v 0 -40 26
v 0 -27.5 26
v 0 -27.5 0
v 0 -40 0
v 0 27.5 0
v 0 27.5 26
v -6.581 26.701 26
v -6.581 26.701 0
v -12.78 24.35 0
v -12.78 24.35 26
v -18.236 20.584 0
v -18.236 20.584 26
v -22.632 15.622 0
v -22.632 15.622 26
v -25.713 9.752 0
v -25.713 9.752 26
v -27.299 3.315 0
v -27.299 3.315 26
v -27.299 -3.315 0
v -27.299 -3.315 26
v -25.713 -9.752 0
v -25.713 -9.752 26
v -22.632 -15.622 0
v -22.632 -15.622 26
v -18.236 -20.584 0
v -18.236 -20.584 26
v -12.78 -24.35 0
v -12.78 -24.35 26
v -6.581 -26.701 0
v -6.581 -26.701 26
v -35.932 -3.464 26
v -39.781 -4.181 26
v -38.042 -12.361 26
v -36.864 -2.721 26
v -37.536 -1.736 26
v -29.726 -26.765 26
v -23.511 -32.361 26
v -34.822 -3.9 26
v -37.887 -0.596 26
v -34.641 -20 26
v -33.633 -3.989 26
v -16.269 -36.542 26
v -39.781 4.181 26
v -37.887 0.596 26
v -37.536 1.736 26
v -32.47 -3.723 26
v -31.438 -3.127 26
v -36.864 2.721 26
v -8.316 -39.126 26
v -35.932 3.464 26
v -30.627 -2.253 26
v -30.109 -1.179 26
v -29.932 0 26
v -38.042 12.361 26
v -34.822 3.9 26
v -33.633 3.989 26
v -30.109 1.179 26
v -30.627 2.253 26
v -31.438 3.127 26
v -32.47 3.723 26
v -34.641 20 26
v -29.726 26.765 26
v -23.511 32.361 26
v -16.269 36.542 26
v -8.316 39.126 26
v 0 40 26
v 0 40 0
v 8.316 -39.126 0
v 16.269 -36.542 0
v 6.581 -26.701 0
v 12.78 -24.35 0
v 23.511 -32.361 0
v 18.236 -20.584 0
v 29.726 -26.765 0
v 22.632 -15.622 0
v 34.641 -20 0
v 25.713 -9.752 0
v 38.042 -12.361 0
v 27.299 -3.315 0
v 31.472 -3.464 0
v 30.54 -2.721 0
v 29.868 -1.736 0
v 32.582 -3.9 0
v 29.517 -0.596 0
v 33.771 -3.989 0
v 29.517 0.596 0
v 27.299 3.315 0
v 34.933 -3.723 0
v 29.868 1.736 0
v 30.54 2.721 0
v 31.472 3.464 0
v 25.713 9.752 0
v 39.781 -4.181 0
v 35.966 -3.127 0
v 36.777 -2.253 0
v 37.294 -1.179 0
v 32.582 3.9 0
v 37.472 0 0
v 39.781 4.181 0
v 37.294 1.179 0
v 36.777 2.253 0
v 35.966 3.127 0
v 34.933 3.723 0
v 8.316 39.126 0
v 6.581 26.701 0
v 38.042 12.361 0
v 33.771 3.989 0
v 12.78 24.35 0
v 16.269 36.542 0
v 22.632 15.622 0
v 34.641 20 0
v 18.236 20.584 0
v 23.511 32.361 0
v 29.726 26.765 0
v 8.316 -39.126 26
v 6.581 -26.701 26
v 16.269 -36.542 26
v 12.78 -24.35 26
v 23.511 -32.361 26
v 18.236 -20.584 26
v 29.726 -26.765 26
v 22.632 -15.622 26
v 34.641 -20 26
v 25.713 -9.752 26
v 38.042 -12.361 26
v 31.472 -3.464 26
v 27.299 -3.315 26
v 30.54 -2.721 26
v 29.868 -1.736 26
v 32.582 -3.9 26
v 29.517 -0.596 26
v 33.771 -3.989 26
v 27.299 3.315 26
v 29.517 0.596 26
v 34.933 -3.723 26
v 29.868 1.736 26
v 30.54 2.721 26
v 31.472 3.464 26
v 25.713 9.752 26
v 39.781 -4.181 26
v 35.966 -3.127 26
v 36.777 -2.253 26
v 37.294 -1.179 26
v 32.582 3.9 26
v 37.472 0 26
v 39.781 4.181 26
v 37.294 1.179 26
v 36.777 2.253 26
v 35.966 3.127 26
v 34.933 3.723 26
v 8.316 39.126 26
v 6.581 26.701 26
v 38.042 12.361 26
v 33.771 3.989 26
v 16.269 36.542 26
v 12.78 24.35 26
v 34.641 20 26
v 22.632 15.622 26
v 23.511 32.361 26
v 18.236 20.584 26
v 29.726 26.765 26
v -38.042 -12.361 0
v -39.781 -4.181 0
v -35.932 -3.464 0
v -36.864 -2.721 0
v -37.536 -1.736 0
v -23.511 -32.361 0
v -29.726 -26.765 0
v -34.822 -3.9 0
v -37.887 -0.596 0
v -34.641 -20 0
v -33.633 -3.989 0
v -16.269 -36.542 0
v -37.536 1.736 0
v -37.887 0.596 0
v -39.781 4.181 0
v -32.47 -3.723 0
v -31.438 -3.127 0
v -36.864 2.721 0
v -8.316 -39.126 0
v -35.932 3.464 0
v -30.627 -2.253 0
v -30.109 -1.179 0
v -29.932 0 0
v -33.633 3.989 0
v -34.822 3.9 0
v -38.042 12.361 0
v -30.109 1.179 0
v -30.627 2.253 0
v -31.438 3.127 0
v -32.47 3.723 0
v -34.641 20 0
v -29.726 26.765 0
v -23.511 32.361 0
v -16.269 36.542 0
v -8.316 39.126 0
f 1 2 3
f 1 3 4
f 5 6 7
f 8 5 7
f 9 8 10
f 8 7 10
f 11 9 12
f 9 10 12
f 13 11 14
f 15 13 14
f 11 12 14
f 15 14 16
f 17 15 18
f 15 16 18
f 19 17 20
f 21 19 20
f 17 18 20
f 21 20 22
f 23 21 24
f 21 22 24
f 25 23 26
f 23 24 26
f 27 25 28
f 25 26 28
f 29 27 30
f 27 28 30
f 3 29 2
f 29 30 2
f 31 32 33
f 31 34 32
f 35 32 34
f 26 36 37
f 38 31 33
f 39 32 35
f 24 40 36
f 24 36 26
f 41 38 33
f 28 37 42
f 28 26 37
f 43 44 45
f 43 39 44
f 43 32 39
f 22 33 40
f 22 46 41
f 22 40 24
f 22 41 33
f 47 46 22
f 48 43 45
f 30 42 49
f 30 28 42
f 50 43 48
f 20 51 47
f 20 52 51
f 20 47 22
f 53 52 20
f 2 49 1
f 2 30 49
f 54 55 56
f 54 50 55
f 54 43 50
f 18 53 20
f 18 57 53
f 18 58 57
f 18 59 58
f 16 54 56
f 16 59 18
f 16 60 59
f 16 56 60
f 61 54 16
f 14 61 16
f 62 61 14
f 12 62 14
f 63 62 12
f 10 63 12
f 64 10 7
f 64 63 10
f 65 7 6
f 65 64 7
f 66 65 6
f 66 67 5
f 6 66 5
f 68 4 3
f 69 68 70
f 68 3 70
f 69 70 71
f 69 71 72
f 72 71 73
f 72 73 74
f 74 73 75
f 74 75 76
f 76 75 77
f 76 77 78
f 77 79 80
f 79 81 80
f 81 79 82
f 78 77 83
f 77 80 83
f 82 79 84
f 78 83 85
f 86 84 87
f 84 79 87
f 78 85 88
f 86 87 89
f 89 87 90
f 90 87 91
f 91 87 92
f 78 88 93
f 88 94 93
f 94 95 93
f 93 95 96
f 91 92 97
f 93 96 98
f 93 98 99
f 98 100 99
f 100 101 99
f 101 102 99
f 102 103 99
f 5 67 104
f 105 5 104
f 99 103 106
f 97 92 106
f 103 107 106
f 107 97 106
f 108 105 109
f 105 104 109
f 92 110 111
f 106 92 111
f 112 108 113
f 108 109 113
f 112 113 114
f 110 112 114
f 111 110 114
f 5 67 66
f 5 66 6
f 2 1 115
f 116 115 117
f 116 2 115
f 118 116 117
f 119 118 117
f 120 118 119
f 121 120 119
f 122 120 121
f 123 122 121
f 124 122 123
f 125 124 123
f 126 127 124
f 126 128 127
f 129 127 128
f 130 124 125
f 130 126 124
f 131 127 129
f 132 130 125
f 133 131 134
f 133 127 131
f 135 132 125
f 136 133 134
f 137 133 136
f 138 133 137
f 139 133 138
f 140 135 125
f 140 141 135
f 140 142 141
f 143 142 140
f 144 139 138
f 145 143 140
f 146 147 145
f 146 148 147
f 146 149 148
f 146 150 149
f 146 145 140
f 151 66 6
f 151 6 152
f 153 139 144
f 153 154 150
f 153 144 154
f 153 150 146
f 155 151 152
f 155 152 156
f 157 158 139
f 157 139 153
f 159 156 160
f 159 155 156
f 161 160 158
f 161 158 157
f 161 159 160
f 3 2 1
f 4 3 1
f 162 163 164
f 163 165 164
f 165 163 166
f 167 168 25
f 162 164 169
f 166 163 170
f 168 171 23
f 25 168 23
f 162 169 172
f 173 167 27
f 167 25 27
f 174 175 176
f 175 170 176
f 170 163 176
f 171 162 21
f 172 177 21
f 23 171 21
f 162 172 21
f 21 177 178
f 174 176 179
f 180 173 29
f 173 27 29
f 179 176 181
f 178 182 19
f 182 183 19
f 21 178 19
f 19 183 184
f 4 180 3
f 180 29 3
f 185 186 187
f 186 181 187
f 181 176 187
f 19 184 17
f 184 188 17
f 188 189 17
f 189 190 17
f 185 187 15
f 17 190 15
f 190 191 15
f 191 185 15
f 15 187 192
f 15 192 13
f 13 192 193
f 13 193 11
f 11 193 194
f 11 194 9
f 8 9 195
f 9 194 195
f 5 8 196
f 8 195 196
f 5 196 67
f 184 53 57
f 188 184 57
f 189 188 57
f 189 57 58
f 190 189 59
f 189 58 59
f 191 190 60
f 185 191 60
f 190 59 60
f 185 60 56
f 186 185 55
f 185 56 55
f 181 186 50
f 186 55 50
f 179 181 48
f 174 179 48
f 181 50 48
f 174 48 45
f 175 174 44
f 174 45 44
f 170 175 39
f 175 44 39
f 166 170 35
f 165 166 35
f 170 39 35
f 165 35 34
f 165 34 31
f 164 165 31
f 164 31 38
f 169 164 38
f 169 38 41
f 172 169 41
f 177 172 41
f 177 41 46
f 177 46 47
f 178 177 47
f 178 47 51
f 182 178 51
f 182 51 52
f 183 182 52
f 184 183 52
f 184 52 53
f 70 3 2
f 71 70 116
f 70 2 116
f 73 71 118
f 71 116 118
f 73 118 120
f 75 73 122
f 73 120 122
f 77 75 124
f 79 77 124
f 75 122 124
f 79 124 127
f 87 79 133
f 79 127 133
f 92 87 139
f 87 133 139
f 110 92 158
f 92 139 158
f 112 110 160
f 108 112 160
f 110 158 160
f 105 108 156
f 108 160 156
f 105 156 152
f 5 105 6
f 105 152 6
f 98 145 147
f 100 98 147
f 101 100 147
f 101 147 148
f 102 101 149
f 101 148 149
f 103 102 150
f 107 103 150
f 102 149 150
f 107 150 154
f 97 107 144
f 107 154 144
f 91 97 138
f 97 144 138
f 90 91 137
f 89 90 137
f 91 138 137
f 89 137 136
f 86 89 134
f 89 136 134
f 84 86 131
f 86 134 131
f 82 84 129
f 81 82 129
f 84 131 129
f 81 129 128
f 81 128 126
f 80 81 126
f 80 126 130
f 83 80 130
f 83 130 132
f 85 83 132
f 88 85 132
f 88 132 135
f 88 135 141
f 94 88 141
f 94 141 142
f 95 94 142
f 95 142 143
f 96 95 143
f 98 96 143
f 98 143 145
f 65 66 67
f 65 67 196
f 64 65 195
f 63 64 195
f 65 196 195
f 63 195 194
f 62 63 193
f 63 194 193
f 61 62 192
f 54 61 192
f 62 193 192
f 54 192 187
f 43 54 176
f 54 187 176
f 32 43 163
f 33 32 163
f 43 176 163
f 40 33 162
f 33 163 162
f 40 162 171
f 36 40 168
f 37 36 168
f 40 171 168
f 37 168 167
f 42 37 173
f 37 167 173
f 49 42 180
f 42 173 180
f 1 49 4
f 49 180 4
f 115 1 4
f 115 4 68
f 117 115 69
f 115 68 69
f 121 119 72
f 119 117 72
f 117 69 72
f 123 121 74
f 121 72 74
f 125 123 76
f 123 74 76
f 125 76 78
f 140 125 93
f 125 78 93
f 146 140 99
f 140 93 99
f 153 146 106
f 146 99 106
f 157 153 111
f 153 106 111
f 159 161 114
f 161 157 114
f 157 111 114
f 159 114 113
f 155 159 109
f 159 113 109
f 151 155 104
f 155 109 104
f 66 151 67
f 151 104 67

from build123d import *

# Parameters (mm, degrees)
SKETCH1_R              = 40
BOSS_EXTRUDE1_DEPTH    = 26
SKETCH2_R              = 27.5
CUT_EXTRUDE1_DEPTH     = 63.257529665
SPLIT1_SURFACE_1_BACK  = 117.086
SPLIT1_SURFACE_1_DEPTH = 234.172
SPLIT1_SURFACE_2_BACK  = 117.086
SPLIT1_SURFACE_2_DEPTH = 234.172
SKETCH4_R              = 4
CUT_EXTRUDE3_DEPTH     = 63.257529665


with BuildPart() as part:
    # Sketch1 → Boss-Extrude1 (new body)
    with BuildSketch(Plane.XY):
        Circle(SKETCH1_R)
    extrude(amount=BOSS_EXTRUDE1_DEPTH)

    # Sketch2 → Cut-Extrude1 (cut, through all)
    with BuildSketch(Plane.XY.offset(26)):
        Circle(SKETCH2_R)
    extrude(amount=-CUT_EXTRUDE1_DEPTH, mode=Mode.SUBTRACT)


with BuildPart() as body_2:
    # Split1: the piece behind the surface
    add(part.part)
    # Split1 surface: a surface, the sketch's curves swept straight by 234.172 mm
    with BuildLine(Plane.XY.offset(-SPLIT1_SURFACE_1_BACK), mode=Mode.PRIVATE) as split1_surface_1_path:
        Line((0, 44.406753527), (0, -43.858522002))
    split1_surface_1 = Shell.extrude(split1_surface_1_path.wire(), (0 * SPLIT1_SURFACE_1_DEPTH, 0 * SPLIT1_SURFACE_1_DEPTH, 1 * SPLIT1_SURFACE_1_DEPTH))
    split(bisect_by=split1_surface_1, keep=Keep.BOTTOM)


with BuildPart() as part_1:
    add(part.part)

    # Split1: split by a surface, the side it looks to stays
    # Split1 surface: a surface, the sketch's curves swept straight by 234.172 mm
    with BuildLine(Plane.XY.offset(-SPLIT1_SURFACE_2_BACK), mode=Mode.PRIVATE) as split1_surface_2_path:
        Line((0, 44.406753527), (0, -43.858522002))
    split1_surface_2 = Shell.extrude(split1_surface_2_path.wire(), (0 * SPLIT1_SURFACE_2_DEPTH, 0 * SPLIT1_SURFACE_2_DEPTH, 1 * SPLIT1_SURFACE_2_DEPTH))
    split(bisect_by=split1_surface_2, keep=Keep.TOP)


with BuildPart() as cut_extrude3_tool:
    # Sketch4 → Cut-Extrude3 (new, through all)
    with BuildSketch(Plane.XY.offset(26)):
        with Locations((-33.931678765, 0)):
            Circle(SKETCH4_R)
        with Locations((33.47196226, 0)):
            Circle(SKETCH4_R)
    extrude(amount=-CUT_EXTRUDE3_DEPTH)


with BuildPart() as part_2:
    add(part_1.part)

    # Cut-Extrude3: cut by cut_extrude3_tool
    add(cut_extrude3_tool.part, mode=Mode.SUBTRACT)


with BuildPart() as body_2_1:
    add(body_2.part)

    # Cut-Extrude3: cut by cut_extrude3_tool
    add(cut_extrude3_tool.part, mode=Mode.SUBTRACT)


solid = Compound([part_2.part, body_2_1.part])
